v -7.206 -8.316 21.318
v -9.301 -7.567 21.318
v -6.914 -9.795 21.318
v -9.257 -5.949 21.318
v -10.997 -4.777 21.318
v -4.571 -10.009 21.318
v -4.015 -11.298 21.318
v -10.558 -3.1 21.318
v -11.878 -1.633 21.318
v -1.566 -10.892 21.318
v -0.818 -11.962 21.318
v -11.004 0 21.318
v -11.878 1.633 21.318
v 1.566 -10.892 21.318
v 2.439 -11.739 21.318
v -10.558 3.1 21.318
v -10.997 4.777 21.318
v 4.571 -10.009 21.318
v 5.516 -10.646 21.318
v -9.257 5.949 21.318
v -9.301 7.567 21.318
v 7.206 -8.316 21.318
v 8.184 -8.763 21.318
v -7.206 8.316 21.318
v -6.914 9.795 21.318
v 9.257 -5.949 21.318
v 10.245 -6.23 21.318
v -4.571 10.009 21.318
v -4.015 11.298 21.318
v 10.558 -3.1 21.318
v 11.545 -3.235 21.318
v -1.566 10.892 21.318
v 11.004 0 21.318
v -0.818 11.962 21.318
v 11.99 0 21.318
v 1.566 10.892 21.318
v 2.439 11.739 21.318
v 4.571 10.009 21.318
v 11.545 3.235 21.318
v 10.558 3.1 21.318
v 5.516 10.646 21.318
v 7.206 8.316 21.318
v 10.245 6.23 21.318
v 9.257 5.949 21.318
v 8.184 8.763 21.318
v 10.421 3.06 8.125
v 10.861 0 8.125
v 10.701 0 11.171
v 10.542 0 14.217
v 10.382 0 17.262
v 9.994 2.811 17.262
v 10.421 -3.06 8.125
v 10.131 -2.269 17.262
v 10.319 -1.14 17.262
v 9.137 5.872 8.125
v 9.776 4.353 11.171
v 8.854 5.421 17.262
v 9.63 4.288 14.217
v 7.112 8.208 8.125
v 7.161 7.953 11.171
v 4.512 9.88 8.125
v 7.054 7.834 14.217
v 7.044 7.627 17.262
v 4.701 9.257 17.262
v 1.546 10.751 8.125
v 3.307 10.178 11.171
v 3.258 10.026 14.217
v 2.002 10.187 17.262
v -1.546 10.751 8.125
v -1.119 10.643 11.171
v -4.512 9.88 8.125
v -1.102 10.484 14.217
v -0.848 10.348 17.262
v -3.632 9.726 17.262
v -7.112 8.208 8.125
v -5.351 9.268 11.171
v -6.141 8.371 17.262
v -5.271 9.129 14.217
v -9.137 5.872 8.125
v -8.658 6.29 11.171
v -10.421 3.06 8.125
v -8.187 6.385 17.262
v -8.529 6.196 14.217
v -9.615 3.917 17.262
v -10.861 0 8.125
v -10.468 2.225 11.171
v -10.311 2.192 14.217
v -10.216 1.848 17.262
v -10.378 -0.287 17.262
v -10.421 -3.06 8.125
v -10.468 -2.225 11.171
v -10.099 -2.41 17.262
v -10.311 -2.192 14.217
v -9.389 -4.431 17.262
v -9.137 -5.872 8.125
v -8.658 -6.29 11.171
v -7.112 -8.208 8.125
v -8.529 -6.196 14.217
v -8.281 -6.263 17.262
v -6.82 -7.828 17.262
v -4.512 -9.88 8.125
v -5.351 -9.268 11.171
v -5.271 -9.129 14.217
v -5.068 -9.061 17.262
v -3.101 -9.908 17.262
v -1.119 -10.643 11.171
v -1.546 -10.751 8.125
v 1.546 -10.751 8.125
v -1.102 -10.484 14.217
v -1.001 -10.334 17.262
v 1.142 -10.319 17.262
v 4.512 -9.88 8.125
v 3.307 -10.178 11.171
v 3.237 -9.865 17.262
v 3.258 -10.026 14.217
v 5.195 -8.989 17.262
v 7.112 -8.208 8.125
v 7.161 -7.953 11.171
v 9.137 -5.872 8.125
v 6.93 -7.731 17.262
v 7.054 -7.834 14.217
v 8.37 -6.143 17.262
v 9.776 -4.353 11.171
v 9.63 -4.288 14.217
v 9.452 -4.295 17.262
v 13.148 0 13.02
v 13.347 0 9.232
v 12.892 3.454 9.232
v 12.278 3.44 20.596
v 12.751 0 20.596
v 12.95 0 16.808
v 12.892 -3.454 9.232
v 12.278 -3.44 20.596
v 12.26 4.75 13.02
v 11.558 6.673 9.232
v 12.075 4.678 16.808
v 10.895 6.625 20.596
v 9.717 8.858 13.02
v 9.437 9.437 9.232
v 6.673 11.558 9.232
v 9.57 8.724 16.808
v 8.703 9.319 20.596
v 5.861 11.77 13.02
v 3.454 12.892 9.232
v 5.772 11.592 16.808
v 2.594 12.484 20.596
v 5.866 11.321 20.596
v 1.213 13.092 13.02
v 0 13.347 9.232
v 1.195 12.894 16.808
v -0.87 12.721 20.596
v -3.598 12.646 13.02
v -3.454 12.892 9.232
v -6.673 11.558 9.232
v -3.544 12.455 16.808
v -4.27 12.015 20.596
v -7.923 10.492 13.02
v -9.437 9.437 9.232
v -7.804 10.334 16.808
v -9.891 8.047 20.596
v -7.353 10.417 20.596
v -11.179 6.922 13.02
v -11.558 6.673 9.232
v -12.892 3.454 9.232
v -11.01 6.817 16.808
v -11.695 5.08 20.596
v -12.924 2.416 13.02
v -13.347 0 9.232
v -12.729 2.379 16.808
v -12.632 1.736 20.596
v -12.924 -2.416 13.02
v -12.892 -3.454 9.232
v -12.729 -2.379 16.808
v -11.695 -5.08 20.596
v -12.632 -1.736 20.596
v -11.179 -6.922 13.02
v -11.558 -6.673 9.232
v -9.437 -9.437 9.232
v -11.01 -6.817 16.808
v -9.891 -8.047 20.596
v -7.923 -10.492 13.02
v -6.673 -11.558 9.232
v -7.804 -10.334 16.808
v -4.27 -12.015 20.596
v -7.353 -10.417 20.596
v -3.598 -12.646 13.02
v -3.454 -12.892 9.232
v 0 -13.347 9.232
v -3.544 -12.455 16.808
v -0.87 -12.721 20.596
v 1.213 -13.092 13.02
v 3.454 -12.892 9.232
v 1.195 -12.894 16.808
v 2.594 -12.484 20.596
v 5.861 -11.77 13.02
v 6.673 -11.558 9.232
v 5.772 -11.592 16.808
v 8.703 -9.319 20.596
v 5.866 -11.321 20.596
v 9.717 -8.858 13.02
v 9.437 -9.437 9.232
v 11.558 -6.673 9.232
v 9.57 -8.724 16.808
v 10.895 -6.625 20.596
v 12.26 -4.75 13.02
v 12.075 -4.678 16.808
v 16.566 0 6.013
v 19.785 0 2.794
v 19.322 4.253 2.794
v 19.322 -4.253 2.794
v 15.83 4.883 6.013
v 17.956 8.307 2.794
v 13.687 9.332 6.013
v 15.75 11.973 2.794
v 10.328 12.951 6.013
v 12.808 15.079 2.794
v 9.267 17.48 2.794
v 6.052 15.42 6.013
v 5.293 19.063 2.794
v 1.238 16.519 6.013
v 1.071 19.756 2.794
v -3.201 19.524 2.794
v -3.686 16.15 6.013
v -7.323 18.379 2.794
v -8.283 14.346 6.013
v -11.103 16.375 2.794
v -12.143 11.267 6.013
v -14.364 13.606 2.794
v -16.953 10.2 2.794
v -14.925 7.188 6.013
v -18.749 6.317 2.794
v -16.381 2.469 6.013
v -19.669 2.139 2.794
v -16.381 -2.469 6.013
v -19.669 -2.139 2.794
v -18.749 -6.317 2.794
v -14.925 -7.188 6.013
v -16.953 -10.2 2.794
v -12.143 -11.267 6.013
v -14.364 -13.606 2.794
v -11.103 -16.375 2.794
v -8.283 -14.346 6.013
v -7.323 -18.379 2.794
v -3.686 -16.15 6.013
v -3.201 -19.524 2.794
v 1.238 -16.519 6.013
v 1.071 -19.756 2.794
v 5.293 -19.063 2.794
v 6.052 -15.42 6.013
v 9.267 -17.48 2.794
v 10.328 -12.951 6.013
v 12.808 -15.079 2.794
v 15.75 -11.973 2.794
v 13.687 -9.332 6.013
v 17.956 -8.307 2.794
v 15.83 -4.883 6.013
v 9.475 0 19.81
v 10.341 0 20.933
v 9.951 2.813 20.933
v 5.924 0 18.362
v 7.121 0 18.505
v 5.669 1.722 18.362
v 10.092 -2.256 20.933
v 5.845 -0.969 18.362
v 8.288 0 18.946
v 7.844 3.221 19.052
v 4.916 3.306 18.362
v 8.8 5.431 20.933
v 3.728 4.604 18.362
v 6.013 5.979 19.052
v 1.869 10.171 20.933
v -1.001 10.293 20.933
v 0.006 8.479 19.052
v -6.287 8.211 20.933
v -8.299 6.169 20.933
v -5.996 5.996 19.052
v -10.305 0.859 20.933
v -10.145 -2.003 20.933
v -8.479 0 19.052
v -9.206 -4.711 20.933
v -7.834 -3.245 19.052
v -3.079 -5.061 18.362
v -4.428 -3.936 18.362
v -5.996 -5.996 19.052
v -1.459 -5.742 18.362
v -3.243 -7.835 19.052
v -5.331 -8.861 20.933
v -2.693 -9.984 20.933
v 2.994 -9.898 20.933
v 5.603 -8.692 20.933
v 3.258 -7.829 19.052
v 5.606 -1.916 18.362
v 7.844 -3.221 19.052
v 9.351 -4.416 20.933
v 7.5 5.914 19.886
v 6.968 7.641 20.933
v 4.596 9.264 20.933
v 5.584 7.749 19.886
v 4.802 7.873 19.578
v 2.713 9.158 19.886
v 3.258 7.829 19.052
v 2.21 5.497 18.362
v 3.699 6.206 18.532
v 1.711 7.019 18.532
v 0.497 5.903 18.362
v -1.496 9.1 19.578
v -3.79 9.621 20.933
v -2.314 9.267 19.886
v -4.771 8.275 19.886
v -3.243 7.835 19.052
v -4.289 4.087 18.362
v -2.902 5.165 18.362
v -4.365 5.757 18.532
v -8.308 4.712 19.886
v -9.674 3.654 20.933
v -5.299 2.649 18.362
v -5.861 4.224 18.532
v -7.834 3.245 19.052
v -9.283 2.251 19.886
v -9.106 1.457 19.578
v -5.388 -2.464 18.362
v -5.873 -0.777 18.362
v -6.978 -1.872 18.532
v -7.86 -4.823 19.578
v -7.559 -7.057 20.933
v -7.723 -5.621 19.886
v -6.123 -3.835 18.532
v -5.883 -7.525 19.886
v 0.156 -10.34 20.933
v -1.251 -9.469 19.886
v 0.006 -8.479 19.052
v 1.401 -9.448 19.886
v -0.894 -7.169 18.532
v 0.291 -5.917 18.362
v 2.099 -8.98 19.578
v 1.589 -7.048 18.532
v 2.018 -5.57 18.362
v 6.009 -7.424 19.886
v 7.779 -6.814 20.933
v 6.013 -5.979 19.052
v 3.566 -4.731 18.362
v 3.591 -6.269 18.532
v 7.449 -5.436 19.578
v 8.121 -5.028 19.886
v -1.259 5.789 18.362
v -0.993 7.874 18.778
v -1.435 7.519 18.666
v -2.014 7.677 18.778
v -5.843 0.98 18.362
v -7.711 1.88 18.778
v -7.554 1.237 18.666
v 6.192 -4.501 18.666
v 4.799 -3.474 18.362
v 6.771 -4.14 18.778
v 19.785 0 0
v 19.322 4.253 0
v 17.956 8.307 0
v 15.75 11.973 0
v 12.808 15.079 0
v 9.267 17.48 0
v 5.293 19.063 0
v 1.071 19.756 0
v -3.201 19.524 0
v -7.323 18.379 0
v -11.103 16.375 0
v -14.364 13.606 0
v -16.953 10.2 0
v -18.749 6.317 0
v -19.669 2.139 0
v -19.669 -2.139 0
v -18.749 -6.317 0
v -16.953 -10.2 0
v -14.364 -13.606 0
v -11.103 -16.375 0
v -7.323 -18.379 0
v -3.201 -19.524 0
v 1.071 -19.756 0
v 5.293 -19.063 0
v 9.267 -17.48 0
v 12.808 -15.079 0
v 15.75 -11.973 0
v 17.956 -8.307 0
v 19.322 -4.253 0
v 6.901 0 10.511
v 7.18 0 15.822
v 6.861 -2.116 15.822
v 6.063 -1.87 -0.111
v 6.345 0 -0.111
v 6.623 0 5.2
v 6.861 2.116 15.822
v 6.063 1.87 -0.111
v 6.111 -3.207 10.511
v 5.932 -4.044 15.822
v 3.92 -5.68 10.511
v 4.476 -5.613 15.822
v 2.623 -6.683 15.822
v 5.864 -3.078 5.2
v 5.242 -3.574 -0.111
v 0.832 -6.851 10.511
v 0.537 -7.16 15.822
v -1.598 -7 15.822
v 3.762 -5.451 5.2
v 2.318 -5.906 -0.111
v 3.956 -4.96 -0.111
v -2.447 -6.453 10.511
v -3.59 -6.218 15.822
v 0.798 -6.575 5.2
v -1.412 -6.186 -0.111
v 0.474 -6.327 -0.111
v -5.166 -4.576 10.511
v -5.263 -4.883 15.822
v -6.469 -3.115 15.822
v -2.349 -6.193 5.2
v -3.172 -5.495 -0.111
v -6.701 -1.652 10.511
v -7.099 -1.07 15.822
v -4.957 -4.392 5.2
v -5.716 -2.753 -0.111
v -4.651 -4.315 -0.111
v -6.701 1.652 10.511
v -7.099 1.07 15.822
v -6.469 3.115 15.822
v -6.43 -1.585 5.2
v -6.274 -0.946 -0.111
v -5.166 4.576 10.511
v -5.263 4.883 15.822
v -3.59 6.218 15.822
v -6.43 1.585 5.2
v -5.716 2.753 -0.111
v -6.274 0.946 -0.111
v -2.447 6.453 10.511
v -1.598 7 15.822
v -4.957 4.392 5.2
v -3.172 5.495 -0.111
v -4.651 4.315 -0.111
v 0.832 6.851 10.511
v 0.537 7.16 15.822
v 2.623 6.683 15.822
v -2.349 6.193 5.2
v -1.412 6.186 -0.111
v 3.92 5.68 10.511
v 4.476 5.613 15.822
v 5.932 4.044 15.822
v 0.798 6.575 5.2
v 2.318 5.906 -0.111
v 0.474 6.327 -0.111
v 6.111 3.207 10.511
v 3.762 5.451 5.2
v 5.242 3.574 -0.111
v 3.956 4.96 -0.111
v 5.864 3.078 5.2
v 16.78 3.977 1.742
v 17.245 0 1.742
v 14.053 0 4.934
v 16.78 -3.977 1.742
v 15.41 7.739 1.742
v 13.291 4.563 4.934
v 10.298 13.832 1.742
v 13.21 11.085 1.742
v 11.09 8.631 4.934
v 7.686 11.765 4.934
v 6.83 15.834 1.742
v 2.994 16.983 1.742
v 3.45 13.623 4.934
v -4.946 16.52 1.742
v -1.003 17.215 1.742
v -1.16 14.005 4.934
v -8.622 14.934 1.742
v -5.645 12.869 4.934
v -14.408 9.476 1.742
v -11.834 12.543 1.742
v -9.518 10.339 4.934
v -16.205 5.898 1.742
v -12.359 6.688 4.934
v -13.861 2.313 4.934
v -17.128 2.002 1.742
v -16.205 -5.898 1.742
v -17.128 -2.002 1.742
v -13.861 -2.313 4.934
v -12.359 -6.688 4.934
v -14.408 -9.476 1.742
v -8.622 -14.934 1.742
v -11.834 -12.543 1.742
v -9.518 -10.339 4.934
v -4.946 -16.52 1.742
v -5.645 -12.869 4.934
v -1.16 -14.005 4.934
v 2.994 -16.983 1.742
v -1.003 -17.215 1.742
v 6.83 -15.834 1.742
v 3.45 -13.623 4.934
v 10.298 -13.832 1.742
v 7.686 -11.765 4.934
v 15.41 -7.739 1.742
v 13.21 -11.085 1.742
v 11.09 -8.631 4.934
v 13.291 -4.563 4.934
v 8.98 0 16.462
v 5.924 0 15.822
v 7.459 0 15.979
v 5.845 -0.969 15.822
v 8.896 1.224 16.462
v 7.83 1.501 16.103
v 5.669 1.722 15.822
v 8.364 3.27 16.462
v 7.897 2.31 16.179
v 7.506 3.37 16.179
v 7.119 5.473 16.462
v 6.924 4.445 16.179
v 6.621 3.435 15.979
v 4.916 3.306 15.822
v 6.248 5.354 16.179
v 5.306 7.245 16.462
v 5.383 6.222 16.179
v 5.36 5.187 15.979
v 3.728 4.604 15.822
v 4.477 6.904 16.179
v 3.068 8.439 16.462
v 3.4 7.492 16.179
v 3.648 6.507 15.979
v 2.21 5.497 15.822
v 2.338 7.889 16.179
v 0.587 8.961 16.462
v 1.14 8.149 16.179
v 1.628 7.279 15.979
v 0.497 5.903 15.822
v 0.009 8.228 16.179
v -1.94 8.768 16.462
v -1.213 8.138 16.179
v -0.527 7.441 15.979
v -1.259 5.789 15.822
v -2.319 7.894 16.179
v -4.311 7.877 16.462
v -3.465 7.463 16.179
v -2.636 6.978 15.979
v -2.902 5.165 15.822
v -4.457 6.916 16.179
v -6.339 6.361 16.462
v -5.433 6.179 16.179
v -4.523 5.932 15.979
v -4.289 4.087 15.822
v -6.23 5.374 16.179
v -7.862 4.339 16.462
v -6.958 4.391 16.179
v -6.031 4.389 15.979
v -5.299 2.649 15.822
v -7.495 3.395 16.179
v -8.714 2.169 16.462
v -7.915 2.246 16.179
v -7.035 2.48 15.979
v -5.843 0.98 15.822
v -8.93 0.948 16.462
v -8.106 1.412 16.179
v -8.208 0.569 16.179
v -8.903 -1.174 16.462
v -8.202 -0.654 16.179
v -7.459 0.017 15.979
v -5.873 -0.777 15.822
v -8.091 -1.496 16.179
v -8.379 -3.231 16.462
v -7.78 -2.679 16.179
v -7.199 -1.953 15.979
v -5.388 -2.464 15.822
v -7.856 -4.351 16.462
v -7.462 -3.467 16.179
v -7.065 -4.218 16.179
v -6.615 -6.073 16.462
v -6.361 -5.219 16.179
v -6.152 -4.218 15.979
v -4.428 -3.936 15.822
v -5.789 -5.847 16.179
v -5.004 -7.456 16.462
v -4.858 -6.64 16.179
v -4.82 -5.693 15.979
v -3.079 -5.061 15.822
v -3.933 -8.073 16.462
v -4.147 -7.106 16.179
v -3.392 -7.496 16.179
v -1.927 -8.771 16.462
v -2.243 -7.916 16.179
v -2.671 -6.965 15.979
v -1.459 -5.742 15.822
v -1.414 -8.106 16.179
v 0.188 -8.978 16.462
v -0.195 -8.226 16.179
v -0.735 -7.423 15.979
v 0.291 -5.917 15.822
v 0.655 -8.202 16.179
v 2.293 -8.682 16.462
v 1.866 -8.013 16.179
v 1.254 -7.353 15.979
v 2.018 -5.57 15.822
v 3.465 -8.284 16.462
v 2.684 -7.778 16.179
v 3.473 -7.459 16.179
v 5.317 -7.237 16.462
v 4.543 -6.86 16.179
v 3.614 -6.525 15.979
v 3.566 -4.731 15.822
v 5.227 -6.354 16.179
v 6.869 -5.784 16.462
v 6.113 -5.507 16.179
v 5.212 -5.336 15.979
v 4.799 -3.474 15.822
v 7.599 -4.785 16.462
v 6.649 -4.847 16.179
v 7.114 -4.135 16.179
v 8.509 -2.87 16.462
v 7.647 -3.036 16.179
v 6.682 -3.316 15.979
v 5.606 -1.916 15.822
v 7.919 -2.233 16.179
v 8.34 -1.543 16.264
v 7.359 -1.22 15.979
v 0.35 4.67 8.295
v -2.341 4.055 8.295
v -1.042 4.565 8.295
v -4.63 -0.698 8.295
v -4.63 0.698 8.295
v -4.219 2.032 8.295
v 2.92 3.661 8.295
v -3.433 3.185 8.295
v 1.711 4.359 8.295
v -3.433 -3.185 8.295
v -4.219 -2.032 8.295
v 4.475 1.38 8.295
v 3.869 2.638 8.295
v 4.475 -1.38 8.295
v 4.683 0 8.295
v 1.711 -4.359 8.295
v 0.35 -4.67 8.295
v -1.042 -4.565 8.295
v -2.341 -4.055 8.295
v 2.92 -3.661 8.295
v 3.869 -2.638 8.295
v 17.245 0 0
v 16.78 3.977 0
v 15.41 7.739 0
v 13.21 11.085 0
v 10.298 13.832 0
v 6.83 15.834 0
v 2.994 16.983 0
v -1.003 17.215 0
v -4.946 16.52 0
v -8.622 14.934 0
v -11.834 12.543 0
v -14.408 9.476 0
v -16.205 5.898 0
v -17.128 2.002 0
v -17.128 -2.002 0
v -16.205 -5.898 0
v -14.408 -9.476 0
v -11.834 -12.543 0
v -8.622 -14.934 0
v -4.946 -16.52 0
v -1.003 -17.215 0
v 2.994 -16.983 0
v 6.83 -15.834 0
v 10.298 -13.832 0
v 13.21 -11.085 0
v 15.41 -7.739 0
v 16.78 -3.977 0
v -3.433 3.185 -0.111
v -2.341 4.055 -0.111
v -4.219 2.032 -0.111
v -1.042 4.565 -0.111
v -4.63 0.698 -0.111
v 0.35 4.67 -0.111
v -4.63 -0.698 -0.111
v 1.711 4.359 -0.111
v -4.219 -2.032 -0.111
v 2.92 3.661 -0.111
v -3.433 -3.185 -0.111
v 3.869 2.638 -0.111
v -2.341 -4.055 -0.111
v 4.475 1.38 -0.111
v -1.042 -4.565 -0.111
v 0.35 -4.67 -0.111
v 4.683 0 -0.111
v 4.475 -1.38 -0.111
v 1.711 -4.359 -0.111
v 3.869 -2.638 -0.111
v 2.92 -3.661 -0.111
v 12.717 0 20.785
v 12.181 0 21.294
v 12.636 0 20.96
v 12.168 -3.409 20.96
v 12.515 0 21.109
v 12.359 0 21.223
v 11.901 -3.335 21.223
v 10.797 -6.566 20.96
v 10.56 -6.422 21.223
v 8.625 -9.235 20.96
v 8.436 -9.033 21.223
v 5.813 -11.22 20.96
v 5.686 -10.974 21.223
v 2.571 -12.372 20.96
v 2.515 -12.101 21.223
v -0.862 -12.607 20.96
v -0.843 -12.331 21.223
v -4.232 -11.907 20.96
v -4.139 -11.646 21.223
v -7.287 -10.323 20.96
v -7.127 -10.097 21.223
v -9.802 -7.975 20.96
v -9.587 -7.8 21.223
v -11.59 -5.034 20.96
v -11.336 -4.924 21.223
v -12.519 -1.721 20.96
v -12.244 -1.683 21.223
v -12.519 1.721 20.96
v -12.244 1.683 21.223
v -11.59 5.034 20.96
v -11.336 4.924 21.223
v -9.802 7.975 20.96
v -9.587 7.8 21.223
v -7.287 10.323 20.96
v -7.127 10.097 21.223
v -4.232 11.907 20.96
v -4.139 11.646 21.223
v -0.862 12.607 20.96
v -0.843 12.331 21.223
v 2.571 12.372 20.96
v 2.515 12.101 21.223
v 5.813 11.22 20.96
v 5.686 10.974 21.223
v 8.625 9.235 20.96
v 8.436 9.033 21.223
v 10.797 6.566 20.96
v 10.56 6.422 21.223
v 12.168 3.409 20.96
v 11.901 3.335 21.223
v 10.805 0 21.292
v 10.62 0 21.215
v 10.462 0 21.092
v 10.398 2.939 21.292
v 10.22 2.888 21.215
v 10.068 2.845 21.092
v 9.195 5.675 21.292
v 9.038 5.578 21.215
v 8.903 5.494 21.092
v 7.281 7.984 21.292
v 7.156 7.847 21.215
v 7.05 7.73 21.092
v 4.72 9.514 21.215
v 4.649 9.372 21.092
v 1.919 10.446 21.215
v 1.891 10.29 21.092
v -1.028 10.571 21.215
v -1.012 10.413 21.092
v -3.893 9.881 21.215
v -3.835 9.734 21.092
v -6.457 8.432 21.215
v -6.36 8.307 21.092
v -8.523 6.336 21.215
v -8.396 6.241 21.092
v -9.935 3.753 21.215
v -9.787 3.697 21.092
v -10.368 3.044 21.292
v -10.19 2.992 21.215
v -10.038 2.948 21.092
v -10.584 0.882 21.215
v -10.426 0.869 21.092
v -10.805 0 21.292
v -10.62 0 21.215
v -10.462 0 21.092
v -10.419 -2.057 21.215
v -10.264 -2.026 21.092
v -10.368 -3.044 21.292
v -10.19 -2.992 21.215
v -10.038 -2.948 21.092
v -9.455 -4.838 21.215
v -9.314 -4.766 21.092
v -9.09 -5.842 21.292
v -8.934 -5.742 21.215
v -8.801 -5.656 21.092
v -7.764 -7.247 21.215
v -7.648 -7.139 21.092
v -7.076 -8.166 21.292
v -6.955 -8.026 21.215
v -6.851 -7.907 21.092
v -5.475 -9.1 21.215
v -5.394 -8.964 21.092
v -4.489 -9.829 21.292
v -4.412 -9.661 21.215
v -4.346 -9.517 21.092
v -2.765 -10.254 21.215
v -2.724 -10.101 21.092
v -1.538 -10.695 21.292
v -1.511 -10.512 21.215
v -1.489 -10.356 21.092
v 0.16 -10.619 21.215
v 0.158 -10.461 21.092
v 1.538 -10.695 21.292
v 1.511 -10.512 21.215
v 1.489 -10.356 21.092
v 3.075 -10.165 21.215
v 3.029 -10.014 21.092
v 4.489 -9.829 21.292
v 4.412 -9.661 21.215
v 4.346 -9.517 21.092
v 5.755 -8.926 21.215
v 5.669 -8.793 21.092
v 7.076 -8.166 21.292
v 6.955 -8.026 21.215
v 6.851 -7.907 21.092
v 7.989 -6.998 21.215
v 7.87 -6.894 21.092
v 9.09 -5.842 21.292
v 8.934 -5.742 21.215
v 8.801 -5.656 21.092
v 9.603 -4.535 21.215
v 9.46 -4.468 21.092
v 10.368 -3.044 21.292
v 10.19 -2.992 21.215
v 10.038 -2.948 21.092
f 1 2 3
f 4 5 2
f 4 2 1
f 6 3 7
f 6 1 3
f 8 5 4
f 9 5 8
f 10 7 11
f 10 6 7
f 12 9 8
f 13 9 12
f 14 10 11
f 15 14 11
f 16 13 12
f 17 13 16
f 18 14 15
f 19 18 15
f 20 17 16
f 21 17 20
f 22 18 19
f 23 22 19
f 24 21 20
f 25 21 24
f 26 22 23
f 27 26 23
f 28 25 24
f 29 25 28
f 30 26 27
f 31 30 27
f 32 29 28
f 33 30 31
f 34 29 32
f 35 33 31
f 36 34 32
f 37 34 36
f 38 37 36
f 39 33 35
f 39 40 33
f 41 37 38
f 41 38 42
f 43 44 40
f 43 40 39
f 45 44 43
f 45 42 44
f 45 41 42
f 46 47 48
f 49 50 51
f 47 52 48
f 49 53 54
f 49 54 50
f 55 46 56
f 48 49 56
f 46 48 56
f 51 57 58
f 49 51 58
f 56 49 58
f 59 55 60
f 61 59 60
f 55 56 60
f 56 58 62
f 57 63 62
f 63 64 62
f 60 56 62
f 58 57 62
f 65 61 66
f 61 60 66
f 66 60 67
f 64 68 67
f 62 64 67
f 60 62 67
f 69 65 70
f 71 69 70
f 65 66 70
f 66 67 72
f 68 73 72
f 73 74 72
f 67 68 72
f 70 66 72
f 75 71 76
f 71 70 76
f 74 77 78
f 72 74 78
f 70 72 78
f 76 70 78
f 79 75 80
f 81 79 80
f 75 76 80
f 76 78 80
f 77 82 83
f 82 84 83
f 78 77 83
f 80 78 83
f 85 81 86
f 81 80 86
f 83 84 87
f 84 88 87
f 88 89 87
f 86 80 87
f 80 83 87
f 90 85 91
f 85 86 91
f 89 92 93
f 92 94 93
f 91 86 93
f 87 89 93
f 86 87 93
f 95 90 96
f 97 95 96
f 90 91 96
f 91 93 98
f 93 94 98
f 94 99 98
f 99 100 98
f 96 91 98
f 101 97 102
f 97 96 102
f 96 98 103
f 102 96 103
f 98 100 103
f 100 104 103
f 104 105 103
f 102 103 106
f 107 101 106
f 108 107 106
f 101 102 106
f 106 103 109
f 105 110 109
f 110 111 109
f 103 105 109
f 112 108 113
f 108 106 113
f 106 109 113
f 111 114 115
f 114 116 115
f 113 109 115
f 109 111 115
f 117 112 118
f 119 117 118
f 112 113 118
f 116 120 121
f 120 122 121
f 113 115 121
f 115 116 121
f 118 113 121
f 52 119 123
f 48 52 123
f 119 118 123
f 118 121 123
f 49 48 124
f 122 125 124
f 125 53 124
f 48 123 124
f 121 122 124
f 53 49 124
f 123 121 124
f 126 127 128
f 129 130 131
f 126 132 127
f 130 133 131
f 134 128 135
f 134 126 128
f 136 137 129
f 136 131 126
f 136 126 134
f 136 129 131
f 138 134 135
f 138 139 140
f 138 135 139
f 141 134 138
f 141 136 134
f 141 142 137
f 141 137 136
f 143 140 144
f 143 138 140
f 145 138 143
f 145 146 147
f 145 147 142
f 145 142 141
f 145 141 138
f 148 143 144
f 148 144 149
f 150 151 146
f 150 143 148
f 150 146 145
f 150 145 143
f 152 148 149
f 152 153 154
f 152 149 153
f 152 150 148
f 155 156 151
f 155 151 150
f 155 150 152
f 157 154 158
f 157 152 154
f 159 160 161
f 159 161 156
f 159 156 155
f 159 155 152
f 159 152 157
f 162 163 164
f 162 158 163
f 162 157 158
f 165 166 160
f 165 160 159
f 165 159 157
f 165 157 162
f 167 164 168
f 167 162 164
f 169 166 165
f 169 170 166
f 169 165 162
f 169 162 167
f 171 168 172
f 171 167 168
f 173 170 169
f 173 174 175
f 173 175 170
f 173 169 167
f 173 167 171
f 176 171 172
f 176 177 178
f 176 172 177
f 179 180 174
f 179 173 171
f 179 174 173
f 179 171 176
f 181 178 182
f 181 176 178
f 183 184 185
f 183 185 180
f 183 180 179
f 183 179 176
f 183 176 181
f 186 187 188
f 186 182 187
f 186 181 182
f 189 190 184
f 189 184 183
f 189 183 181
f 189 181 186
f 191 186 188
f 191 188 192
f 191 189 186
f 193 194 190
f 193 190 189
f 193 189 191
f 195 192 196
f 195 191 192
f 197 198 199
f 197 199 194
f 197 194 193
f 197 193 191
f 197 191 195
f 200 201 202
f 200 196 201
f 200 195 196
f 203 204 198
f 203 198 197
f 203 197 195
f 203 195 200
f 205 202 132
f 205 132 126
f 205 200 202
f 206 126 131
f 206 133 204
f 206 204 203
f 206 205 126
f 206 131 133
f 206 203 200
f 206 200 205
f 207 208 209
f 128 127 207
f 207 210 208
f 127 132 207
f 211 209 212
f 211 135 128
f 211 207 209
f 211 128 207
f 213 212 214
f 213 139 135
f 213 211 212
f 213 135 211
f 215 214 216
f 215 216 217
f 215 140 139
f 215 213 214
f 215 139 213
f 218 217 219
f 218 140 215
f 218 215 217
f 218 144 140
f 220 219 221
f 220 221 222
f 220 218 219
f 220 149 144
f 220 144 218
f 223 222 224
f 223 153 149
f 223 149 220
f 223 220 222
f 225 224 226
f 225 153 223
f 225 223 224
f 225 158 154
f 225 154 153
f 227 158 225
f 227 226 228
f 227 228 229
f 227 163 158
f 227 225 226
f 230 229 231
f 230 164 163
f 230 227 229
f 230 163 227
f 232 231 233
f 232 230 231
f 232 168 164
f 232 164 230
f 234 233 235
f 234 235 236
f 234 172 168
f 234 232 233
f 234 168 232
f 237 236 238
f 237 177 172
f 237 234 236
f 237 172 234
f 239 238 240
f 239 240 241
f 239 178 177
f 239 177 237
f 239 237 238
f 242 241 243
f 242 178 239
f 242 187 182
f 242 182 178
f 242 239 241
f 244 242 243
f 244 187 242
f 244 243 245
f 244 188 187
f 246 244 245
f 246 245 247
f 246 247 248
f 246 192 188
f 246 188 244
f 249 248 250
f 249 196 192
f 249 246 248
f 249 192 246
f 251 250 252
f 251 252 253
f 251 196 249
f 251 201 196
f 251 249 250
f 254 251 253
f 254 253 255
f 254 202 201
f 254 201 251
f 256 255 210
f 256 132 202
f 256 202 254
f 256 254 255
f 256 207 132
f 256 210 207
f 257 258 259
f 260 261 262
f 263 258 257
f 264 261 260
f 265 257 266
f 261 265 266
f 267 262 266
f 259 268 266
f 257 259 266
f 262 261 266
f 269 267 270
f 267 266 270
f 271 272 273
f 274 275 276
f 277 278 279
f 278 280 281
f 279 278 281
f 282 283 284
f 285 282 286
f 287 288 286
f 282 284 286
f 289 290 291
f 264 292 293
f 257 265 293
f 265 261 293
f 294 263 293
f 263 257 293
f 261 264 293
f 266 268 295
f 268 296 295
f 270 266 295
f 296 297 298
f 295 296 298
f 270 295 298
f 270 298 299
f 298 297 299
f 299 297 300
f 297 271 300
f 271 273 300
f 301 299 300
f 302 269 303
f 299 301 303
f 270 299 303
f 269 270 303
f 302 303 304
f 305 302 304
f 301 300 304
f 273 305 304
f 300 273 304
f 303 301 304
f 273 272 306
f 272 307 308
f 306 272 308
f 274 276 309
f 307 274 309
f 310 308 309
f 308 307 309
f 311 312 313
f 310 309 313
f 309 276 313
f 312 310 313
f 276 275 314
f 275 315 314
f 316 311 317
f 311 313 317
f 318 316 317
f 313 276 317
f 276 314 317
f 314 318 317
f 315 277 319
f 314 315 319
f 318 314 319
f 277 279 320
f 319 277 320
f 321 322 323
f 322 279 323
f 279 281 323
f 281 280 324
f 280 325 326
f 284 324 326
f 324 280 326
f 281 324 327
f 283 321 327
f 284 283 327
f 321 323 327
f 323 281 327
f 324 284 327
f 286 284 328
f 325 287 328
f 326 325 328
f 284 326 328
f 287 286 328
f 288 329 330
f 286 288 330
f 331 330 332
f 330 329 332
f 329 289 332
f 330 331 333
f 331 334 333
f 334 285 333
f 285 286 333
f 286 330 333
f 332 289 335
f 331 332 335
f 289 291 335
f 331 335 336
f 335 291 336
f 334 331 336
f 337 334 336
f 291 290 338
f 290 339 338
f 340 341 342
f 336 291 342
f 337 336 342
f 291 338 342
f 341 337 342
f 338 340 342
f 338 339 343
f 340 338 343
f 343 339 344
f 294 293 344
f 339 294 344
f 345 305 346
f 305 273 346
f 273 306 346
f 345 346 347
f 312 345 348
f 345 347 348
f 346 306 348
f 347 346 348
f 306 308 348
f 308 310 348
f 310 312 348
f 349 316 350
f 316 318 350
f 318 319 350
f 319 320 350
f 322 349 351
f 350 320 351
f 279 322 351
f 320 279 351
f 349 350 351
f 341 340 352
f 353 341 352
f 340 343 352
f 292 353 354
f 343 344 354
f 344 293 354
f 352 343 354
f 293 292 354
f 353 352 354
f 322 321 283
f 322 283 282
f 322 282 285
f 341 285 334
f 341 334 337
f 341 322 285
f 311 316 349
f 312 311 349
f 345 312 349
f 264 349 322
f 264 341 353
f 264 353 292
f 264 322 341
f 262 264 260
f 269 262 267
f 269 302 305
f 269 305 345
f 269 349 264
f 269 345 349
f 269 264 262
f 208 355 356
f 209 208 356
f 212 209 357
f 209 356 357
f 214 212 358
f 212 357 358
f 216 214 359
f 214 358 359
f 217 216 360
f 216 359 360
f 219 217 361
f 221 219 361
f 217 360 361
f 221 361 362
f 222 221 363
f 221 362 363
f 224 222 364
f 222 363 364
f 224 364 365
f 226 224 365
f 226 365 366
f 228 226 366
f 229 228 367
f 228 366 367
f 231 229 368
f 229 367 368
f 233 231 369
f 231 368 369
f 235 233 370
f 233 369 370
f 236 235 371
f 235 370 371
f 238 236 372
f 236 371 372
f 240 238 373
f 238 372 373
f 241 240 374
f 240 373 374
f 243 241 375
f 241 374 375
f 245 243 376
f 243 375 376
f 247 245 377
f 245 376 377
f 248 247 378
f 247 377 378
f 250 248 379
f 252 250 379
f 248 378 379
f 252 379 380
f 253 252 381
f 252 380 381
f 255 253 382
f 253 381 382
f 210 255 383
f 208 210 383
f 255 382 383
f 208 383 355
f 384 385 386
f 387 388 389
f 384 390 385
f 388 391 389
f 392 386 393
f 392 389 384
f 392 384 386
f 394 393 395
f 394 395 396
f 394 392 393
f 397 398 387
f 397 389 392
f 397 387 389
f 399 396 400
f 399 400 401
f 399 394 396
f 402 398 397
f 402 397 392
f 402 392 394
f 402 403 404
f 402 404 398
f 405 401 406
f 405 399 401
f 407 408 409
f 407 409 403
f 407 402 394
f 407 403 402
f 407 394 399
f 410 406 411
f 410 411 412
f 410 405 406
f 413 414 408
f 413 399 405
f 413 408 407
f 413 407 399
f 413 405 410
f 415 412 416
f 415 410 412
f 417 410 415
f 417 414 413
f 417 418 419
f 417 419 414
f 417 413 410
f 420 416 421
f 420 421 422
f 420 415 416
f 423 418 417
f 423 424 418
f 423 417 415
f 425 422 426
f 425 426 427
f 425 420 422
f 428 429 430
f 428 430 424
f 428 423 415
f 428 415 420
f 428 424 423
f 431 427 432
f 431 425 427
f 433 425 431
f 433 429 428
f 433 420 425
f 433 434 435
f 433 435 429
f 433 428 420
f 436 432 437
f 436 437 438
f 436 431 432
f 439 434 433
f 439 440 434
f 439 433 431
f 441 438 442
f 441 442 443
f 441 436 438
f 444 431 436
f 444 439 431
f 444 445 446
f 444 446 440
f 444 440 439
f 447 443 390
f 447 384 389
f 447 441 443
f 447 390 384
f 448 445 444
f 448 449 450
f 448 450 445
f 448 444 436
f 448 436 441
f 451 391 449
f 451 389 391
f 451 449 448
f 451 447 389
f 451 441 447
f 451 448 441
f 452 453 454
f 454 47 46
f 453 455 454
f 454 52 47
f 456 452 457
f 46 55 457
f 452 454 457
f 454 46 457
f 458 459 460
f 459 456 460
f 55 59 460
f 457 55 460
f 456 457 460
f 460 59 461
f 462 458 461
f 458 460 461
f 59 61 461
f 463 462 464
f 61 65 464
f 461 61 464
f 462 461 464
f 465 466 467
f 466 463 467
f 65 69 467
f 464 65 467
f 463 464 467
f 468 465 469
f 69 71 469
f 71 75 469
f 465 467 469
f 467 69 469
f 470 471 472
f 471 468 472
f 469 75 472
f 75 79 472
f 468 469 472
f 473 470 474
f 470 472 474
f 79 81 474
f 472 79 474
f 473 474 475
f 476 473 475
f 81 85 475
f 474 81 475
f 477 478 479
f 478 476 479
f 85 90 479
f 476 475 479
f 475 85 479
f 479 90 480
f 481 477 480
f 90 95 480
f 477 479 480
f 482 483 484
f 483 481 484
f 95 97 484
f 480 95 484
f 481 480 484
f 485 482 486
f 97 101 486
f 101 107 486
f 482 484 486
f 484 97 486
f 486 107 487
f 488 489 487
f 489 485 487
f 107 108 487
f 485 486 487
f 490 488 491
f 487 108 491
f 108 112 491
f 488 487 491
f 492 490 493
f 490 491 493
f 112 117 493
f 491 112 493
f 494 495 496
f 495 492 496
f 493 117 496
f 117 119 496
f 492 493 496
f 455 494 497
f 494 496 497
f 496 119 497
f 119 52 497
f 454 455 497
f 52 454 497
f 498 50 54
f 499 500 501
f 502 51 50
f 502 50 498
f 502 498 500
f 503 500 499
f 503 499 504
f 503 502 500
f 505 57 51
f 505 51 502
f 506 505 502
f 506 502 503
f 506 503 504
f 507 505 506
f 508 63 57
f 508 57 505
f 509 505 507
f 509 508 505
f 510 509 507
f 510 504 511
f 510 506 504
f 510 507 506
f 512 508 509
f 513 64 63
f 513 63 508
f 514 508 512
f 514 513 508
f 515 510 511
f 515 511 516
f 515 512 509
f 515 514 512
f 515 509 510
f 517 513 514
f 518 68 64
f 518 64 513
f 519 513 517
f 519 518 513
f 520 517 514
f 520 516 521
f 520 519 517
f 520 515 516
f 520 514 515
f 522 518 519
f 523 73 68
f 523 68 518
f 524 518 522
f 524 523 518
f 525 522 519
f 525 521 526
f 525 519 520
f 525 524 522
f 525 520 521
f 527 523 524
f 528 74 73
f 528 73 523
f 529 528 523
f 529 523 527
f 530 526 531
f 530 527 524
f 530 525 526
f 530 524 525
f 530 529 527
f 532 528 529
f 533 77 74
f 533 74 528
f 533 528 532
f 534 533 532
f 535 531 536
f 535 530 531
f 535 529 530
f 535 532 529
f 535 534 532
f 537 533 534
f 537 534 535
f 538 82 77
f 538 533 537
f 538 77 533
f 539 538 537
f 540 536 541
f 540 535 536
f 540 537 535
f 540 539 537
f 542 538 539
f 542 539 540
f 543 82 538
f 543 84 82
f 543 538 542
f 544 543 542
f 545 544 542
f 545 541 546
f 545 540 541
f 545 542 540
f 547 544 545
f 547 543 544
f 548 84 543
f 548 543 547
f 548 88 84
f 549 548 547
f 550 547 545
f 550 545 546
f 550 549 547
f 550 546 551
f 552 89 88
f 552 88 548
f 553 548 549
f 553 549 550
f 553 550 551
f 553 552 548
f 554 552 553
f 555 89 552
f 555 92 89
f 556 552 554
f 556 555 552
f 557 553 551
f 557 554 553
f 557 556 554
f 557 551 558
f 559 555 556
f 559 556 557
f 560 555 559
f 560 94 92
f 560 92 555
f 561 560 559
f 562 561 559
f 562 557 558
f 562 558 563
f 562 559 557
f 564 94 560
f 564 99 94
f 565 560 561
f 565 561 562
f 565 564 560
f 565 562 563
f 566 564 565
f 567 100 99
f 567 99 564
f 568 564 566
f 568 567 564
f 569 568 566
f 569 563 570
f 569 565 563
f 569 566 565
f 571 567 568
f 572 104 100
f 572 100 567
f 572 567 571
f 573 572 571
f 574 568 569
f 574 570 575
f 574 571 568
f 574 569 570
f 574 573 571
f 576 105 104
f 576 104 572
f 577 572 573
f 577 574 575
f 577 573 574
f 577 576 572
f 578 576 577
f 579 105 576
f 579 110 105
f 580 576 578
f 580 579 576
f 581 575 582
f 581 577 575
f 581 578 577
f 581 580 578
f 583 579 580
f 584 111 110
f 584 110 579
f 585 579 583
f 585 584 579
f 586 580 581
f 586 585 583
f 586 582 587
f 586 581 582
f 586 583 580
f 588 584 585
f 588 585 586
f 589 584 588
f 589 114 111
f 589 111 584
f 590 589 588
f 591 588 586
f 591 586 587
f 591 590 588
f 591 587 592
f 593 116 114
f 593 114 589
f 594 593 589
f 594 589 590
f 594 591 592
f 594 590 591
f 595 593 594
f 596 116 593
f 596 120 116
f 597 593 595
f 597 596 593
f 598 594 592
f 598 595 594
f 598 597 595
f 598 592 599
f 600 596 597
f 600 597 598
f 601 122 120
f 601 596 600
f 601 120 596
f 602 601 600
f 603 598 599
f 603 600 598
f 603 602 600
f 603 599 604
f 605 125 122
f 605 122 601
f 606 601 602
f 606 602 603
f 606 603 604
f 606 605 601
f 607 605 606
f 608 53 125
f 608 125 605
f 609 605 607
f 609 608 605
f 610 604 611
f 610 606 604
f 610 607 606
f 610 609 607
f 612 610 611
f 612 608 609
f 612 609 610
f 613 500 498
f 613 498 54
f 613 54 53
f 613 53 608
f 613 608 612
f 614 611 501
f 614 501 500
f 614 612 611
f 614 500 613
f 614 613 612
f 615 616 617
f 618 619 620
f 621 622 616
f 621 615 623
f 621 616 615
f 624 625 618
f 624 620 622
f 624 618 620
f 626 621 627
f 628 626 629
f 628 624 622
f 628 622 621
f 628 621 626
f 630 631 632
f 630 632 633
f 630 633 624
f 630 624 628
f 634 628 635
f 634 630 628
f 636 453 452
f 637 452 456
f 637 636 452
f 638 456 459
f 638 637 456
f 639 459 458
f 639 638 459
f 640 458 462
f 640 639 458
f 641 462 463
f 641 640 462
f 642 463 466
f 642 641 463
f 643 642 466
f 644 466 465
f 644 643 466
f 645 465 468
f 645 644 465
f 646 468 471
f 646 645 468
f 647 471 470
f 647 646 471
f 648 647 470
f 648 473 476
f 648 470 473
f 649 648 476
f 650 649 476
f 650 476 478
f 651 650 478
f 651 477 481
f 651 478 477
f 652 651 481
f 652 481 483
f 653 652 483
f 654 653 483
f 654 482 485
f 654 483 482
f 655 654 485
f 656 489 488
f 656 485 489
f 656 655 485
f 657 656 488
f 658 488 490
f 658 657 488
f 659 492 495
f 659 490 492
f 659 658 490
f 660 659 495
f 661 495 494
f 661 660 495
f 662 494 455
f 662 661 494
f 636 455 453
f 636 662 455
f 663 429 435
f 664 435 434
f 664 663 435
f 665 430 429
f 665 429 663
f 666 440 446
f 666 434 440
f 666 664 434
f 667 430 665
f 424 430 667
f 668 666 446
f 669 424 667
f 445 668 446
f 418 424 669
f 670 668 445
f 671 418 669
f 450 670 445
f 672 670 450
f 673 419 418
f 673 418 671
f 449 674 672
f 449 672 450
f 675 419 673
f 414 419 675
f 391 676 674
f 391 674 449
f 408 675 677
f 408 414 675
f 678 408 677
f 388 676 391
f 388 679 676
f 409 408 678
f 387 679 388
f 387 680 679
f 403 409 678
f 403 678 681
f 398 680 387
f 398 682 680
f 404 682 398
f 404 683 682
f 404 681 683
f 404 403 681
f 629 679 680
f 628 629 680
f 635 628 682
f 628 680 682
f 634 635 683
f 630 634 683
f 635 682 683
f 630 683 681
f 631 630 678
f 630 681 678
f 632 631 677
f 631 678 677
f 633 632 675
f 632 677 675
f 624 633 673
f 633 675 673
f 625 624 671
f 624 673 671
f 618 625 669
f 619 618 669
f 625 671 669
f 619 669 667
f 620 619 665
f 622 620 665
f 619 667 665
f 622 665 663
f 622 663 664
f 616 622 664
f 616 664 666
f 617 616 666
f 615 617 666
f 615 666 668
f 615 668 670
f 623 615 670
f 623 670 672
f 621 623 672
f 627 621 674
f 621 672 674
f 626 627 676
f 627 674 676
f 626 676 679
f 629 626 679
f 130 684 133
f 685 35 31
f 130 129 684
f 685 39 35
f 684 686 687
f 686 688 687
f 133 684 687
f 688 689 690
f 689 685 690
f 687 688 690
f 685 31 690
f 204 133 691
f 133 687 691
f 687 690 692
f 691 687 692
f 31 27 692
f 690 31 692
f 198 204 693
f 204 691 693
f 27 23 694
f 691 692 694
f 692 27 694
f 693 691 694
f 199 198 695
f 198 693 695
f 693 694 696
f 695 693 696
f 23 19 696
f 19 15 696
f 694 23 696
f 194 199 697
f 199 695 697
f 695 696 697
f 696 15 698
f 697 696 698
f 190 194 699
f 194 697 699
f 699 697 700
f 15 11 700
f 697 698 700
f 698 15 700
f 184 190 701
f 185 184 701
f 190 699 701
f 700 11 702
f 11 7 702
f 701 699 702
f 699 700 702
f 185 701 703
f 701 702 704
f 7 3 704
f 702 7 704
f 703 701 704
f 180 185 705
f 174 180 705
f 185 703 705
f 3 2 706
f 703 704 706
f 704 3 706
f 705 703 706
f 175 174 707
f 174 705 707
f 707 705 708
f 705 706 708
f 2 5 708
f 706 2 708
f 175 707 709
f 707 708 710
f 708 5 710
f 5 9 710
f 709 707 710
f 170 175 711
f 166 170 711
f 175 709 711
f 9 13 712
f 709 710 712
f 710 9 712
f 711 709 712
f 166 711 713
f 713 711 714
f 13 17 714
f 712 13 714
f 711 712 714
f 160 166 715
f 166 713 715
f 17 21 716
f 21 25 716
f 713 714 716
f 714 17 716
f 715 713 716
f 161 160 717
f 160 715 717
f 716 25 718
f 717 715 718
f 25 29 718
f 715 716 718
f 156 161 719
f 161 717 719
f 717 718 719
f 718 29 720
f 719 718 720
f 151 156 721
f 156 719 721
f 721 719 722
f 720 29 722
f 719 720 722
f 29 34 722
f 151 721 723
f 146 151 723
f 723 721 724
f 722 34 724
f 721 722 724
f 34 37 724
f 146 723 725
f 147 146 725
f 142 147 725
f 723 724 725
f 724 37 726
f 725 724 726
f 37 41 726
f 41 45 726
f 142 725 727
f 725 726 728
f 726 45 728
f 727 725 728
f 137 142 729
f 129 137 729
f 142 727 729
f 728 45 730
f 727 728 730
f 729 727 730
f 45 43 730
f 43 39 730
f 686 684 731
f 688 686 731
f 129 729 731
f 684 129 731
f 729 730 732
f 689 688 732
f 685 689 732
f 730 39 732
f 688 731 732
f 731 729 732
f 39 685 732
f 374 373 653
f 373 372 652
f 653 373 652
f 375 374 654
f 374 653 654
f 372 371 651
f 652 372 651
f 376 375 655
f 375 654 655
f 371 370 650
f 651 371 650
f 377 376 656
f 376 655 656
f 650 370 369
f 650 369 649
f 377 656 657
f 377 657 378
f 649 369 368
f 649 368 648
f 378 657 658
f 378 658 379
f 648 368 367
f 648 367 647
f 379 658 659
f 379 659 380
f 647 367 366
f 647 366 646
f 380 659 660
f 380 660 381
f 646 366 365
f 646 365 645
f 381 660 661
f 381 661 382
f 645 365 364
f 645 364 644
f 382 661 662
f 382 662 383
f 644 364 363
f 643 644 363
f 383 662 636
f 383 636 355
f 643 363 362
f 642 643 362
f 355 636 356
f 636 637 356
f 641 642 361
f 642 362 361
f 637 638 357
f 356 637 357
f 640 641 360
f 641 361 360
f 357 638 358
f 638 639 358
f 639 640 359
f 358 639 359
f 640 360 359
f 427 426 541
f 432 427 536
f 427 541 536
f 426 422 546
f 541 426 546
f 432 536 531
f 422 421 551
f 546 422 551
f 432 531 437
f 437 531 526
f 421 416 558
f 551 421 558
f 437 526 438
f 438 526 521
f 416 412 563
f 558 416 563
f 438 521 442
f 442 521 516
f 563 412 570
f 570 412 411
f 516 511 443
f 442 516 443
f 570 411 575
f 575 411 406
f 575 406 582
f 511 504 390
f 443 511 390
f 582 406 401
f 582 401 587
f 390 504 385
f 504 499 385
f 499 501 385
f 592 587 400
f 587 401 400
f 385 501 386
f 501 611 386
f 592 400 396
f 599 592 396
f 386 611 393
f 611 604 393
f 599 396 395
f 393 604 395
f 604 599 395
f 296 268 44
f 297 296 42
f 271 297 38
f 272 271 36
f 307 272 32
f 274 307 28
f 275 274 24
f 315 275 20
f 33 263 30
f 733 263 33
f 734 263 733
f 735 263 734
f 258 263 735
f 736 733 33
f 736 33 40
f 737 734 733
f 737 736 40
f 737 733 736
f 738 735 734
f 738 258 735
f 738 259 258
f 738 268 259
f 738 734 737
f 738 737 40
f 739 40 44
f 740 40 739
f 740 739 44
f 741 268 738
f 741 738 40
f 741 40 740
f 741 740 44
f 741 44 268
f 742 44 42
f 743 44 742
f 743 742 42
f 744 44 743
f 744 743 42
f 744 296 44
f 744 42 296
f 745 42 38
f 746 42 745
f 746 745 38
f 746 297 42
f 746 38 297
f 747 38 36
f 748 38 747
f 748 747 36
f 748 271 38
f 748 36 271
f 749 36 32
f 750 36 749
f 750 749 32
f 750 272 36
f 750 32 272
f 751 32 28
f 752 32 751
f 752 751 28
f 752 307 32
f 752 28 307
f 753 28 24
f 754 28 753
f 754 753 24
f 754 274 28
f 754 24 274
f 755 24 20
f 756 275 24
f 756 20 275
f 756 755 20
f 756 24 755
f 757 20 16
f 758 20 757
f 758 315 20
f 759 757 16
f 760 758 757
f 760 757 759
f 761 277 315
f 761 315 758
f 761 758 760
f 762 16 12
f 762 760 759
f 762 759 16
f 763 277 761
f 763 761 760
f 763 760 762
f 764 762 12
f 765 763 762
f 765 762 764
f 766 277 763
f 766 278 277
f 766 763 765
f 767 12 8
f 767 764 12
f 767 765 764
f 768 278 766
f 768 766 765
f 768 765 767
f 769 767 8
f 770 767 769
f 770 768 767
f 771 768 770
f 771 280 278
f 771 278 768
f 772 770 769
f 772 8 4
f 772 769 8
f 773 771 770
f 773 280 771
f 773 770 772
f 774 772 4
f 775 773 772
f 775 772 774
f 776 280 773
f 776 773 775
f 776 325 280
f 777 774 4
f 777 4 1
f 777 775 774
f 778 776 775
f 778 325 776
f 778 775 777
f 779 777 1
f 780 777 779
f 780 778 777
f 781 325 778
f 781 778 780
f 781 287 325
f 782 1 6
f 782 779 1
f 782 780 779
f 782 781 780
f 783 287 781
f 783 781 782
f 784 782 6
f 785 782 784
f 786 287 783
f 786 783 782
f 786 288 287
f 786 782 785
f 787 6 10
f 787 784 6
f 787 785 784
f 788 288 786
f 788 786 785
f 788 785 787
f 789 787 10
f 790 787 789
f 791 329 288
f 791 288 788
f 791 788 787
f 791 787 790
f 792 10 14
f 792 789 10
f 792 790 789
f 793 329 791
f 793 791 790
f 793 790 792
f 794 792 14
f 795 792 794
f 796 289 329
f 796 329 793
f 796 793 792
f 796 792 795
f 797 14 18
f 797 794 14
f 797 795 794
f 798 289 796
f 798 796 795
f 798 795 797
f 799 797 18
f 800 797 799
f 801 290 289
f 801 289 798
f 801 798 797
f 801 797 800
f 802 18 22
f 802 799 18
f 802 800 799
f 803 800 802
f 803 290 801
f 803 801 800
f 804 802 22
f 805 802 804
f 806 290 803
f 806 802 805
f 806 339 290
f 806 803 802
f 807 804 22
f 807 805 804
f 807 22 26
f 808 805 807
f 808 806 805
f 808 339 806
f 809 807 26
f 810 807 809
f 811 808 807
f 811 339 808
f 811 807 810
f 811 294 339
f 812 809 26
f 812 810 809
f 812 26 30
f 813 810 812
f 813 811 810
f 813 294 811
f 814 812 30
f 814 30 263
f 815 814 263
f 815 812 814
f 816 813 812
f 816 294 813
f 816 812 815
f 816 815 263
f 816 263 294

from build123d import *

# Parameters (mm, degrees)
F0_R      = 19.7846022737
F1_DEPTH  = 2.794
F1_FACE_R = 19.7846022737
F2_DEPTH  = 6.43804
F2_TAPER  = 45
F2_FACE_R = 13.3465622737
F3_DEPTH  = 12.08628
F3_TAPER  = 3
F4_R      = 10.241679593
F5_DEPTH  = 2.95594
F6_R      = 0.762
F7_R      = 5.08
F8_T      = -2.54
F9_R      = 7.1796509853
F10_DEPTH = 15.93384
F10_TAPER = 3
F11_R     = 4.6826437898
F12_DEPTH = 8.40654


with BuildPart() as f1:
    # F0 (on Top) → F1 (new body)
    with BuildSketch(Plane.XY):
        Circle(F0_R)
    extrude(amount=F1_DEPTH)

    # F1_face (on face) → F2 (join)
    with BuildSketch(Plane.XY.offset(2.794)):
        Circle(F1_FACE_R)
    extrude(amount=F2_DEPTH, taper=F2_TAPER)

    # F2_face (on face) → F3 (join)
    with BuildSketch(Plane.XY.offset(9.23204)):
        Circle(F2_FACE_R)
    extrude(amount=F3_DEPTH, taper=F3_TAPER)

    # F4 (on face) → F5 (cut, symmetric)
    with BuildSketch(Plane.XY.offset(21.31832)):
        Circle(F4_R)
    extrude(amount=F5_DEPTH, both=True, mode=Mode.SUBTRACT)

    # F6
    f6_edges = [f1.edges().sort_by_distance(p)[0] for p in [
        (-12.713147, 0, 21.31832),
        (-10.24168, 0, 21.31832),
    ]]
    fillet(f6_edges, radius=F6_R)

    # F7
    f7_edges = [f1.edges().sort_by_distance(p)[0] for p in [
        (-10.24168, 0, 18.36238),
    ]]
    fillet(f7_edges, radius=F7_R)

    # F8
    f8_openings = [f1.faces().sort_by_distance(p)[0] for p in [
        (0, 0, 0),
    ]]
    offset(amount=F8_T, openings=f8_openings, kind=Kind.INTERSECTION)

    # F9 (on face) → F10 (join)
    with BuildSketch(Plane(origin=(0, 0, 15.82238), x_dir=(1, 0, 0), z_dir=(0, 0, -1))):
        Circle(F9_R)
    extrude(amount=F10_DEPTH, taper=F10_TAPER)

    # F11 (on face) → F12 (cut, symmetric)
    with BuildSketch(Plane(origin=(0, 0, -0.11146), x_dir=(1, 0, 0), z_dir=(0, 0, -1))):
        Circle(F11_R)
    extrude(amount=F12_DEPTH, both=True, mode=Mode.SUBTRACT)


solid = f1.part
